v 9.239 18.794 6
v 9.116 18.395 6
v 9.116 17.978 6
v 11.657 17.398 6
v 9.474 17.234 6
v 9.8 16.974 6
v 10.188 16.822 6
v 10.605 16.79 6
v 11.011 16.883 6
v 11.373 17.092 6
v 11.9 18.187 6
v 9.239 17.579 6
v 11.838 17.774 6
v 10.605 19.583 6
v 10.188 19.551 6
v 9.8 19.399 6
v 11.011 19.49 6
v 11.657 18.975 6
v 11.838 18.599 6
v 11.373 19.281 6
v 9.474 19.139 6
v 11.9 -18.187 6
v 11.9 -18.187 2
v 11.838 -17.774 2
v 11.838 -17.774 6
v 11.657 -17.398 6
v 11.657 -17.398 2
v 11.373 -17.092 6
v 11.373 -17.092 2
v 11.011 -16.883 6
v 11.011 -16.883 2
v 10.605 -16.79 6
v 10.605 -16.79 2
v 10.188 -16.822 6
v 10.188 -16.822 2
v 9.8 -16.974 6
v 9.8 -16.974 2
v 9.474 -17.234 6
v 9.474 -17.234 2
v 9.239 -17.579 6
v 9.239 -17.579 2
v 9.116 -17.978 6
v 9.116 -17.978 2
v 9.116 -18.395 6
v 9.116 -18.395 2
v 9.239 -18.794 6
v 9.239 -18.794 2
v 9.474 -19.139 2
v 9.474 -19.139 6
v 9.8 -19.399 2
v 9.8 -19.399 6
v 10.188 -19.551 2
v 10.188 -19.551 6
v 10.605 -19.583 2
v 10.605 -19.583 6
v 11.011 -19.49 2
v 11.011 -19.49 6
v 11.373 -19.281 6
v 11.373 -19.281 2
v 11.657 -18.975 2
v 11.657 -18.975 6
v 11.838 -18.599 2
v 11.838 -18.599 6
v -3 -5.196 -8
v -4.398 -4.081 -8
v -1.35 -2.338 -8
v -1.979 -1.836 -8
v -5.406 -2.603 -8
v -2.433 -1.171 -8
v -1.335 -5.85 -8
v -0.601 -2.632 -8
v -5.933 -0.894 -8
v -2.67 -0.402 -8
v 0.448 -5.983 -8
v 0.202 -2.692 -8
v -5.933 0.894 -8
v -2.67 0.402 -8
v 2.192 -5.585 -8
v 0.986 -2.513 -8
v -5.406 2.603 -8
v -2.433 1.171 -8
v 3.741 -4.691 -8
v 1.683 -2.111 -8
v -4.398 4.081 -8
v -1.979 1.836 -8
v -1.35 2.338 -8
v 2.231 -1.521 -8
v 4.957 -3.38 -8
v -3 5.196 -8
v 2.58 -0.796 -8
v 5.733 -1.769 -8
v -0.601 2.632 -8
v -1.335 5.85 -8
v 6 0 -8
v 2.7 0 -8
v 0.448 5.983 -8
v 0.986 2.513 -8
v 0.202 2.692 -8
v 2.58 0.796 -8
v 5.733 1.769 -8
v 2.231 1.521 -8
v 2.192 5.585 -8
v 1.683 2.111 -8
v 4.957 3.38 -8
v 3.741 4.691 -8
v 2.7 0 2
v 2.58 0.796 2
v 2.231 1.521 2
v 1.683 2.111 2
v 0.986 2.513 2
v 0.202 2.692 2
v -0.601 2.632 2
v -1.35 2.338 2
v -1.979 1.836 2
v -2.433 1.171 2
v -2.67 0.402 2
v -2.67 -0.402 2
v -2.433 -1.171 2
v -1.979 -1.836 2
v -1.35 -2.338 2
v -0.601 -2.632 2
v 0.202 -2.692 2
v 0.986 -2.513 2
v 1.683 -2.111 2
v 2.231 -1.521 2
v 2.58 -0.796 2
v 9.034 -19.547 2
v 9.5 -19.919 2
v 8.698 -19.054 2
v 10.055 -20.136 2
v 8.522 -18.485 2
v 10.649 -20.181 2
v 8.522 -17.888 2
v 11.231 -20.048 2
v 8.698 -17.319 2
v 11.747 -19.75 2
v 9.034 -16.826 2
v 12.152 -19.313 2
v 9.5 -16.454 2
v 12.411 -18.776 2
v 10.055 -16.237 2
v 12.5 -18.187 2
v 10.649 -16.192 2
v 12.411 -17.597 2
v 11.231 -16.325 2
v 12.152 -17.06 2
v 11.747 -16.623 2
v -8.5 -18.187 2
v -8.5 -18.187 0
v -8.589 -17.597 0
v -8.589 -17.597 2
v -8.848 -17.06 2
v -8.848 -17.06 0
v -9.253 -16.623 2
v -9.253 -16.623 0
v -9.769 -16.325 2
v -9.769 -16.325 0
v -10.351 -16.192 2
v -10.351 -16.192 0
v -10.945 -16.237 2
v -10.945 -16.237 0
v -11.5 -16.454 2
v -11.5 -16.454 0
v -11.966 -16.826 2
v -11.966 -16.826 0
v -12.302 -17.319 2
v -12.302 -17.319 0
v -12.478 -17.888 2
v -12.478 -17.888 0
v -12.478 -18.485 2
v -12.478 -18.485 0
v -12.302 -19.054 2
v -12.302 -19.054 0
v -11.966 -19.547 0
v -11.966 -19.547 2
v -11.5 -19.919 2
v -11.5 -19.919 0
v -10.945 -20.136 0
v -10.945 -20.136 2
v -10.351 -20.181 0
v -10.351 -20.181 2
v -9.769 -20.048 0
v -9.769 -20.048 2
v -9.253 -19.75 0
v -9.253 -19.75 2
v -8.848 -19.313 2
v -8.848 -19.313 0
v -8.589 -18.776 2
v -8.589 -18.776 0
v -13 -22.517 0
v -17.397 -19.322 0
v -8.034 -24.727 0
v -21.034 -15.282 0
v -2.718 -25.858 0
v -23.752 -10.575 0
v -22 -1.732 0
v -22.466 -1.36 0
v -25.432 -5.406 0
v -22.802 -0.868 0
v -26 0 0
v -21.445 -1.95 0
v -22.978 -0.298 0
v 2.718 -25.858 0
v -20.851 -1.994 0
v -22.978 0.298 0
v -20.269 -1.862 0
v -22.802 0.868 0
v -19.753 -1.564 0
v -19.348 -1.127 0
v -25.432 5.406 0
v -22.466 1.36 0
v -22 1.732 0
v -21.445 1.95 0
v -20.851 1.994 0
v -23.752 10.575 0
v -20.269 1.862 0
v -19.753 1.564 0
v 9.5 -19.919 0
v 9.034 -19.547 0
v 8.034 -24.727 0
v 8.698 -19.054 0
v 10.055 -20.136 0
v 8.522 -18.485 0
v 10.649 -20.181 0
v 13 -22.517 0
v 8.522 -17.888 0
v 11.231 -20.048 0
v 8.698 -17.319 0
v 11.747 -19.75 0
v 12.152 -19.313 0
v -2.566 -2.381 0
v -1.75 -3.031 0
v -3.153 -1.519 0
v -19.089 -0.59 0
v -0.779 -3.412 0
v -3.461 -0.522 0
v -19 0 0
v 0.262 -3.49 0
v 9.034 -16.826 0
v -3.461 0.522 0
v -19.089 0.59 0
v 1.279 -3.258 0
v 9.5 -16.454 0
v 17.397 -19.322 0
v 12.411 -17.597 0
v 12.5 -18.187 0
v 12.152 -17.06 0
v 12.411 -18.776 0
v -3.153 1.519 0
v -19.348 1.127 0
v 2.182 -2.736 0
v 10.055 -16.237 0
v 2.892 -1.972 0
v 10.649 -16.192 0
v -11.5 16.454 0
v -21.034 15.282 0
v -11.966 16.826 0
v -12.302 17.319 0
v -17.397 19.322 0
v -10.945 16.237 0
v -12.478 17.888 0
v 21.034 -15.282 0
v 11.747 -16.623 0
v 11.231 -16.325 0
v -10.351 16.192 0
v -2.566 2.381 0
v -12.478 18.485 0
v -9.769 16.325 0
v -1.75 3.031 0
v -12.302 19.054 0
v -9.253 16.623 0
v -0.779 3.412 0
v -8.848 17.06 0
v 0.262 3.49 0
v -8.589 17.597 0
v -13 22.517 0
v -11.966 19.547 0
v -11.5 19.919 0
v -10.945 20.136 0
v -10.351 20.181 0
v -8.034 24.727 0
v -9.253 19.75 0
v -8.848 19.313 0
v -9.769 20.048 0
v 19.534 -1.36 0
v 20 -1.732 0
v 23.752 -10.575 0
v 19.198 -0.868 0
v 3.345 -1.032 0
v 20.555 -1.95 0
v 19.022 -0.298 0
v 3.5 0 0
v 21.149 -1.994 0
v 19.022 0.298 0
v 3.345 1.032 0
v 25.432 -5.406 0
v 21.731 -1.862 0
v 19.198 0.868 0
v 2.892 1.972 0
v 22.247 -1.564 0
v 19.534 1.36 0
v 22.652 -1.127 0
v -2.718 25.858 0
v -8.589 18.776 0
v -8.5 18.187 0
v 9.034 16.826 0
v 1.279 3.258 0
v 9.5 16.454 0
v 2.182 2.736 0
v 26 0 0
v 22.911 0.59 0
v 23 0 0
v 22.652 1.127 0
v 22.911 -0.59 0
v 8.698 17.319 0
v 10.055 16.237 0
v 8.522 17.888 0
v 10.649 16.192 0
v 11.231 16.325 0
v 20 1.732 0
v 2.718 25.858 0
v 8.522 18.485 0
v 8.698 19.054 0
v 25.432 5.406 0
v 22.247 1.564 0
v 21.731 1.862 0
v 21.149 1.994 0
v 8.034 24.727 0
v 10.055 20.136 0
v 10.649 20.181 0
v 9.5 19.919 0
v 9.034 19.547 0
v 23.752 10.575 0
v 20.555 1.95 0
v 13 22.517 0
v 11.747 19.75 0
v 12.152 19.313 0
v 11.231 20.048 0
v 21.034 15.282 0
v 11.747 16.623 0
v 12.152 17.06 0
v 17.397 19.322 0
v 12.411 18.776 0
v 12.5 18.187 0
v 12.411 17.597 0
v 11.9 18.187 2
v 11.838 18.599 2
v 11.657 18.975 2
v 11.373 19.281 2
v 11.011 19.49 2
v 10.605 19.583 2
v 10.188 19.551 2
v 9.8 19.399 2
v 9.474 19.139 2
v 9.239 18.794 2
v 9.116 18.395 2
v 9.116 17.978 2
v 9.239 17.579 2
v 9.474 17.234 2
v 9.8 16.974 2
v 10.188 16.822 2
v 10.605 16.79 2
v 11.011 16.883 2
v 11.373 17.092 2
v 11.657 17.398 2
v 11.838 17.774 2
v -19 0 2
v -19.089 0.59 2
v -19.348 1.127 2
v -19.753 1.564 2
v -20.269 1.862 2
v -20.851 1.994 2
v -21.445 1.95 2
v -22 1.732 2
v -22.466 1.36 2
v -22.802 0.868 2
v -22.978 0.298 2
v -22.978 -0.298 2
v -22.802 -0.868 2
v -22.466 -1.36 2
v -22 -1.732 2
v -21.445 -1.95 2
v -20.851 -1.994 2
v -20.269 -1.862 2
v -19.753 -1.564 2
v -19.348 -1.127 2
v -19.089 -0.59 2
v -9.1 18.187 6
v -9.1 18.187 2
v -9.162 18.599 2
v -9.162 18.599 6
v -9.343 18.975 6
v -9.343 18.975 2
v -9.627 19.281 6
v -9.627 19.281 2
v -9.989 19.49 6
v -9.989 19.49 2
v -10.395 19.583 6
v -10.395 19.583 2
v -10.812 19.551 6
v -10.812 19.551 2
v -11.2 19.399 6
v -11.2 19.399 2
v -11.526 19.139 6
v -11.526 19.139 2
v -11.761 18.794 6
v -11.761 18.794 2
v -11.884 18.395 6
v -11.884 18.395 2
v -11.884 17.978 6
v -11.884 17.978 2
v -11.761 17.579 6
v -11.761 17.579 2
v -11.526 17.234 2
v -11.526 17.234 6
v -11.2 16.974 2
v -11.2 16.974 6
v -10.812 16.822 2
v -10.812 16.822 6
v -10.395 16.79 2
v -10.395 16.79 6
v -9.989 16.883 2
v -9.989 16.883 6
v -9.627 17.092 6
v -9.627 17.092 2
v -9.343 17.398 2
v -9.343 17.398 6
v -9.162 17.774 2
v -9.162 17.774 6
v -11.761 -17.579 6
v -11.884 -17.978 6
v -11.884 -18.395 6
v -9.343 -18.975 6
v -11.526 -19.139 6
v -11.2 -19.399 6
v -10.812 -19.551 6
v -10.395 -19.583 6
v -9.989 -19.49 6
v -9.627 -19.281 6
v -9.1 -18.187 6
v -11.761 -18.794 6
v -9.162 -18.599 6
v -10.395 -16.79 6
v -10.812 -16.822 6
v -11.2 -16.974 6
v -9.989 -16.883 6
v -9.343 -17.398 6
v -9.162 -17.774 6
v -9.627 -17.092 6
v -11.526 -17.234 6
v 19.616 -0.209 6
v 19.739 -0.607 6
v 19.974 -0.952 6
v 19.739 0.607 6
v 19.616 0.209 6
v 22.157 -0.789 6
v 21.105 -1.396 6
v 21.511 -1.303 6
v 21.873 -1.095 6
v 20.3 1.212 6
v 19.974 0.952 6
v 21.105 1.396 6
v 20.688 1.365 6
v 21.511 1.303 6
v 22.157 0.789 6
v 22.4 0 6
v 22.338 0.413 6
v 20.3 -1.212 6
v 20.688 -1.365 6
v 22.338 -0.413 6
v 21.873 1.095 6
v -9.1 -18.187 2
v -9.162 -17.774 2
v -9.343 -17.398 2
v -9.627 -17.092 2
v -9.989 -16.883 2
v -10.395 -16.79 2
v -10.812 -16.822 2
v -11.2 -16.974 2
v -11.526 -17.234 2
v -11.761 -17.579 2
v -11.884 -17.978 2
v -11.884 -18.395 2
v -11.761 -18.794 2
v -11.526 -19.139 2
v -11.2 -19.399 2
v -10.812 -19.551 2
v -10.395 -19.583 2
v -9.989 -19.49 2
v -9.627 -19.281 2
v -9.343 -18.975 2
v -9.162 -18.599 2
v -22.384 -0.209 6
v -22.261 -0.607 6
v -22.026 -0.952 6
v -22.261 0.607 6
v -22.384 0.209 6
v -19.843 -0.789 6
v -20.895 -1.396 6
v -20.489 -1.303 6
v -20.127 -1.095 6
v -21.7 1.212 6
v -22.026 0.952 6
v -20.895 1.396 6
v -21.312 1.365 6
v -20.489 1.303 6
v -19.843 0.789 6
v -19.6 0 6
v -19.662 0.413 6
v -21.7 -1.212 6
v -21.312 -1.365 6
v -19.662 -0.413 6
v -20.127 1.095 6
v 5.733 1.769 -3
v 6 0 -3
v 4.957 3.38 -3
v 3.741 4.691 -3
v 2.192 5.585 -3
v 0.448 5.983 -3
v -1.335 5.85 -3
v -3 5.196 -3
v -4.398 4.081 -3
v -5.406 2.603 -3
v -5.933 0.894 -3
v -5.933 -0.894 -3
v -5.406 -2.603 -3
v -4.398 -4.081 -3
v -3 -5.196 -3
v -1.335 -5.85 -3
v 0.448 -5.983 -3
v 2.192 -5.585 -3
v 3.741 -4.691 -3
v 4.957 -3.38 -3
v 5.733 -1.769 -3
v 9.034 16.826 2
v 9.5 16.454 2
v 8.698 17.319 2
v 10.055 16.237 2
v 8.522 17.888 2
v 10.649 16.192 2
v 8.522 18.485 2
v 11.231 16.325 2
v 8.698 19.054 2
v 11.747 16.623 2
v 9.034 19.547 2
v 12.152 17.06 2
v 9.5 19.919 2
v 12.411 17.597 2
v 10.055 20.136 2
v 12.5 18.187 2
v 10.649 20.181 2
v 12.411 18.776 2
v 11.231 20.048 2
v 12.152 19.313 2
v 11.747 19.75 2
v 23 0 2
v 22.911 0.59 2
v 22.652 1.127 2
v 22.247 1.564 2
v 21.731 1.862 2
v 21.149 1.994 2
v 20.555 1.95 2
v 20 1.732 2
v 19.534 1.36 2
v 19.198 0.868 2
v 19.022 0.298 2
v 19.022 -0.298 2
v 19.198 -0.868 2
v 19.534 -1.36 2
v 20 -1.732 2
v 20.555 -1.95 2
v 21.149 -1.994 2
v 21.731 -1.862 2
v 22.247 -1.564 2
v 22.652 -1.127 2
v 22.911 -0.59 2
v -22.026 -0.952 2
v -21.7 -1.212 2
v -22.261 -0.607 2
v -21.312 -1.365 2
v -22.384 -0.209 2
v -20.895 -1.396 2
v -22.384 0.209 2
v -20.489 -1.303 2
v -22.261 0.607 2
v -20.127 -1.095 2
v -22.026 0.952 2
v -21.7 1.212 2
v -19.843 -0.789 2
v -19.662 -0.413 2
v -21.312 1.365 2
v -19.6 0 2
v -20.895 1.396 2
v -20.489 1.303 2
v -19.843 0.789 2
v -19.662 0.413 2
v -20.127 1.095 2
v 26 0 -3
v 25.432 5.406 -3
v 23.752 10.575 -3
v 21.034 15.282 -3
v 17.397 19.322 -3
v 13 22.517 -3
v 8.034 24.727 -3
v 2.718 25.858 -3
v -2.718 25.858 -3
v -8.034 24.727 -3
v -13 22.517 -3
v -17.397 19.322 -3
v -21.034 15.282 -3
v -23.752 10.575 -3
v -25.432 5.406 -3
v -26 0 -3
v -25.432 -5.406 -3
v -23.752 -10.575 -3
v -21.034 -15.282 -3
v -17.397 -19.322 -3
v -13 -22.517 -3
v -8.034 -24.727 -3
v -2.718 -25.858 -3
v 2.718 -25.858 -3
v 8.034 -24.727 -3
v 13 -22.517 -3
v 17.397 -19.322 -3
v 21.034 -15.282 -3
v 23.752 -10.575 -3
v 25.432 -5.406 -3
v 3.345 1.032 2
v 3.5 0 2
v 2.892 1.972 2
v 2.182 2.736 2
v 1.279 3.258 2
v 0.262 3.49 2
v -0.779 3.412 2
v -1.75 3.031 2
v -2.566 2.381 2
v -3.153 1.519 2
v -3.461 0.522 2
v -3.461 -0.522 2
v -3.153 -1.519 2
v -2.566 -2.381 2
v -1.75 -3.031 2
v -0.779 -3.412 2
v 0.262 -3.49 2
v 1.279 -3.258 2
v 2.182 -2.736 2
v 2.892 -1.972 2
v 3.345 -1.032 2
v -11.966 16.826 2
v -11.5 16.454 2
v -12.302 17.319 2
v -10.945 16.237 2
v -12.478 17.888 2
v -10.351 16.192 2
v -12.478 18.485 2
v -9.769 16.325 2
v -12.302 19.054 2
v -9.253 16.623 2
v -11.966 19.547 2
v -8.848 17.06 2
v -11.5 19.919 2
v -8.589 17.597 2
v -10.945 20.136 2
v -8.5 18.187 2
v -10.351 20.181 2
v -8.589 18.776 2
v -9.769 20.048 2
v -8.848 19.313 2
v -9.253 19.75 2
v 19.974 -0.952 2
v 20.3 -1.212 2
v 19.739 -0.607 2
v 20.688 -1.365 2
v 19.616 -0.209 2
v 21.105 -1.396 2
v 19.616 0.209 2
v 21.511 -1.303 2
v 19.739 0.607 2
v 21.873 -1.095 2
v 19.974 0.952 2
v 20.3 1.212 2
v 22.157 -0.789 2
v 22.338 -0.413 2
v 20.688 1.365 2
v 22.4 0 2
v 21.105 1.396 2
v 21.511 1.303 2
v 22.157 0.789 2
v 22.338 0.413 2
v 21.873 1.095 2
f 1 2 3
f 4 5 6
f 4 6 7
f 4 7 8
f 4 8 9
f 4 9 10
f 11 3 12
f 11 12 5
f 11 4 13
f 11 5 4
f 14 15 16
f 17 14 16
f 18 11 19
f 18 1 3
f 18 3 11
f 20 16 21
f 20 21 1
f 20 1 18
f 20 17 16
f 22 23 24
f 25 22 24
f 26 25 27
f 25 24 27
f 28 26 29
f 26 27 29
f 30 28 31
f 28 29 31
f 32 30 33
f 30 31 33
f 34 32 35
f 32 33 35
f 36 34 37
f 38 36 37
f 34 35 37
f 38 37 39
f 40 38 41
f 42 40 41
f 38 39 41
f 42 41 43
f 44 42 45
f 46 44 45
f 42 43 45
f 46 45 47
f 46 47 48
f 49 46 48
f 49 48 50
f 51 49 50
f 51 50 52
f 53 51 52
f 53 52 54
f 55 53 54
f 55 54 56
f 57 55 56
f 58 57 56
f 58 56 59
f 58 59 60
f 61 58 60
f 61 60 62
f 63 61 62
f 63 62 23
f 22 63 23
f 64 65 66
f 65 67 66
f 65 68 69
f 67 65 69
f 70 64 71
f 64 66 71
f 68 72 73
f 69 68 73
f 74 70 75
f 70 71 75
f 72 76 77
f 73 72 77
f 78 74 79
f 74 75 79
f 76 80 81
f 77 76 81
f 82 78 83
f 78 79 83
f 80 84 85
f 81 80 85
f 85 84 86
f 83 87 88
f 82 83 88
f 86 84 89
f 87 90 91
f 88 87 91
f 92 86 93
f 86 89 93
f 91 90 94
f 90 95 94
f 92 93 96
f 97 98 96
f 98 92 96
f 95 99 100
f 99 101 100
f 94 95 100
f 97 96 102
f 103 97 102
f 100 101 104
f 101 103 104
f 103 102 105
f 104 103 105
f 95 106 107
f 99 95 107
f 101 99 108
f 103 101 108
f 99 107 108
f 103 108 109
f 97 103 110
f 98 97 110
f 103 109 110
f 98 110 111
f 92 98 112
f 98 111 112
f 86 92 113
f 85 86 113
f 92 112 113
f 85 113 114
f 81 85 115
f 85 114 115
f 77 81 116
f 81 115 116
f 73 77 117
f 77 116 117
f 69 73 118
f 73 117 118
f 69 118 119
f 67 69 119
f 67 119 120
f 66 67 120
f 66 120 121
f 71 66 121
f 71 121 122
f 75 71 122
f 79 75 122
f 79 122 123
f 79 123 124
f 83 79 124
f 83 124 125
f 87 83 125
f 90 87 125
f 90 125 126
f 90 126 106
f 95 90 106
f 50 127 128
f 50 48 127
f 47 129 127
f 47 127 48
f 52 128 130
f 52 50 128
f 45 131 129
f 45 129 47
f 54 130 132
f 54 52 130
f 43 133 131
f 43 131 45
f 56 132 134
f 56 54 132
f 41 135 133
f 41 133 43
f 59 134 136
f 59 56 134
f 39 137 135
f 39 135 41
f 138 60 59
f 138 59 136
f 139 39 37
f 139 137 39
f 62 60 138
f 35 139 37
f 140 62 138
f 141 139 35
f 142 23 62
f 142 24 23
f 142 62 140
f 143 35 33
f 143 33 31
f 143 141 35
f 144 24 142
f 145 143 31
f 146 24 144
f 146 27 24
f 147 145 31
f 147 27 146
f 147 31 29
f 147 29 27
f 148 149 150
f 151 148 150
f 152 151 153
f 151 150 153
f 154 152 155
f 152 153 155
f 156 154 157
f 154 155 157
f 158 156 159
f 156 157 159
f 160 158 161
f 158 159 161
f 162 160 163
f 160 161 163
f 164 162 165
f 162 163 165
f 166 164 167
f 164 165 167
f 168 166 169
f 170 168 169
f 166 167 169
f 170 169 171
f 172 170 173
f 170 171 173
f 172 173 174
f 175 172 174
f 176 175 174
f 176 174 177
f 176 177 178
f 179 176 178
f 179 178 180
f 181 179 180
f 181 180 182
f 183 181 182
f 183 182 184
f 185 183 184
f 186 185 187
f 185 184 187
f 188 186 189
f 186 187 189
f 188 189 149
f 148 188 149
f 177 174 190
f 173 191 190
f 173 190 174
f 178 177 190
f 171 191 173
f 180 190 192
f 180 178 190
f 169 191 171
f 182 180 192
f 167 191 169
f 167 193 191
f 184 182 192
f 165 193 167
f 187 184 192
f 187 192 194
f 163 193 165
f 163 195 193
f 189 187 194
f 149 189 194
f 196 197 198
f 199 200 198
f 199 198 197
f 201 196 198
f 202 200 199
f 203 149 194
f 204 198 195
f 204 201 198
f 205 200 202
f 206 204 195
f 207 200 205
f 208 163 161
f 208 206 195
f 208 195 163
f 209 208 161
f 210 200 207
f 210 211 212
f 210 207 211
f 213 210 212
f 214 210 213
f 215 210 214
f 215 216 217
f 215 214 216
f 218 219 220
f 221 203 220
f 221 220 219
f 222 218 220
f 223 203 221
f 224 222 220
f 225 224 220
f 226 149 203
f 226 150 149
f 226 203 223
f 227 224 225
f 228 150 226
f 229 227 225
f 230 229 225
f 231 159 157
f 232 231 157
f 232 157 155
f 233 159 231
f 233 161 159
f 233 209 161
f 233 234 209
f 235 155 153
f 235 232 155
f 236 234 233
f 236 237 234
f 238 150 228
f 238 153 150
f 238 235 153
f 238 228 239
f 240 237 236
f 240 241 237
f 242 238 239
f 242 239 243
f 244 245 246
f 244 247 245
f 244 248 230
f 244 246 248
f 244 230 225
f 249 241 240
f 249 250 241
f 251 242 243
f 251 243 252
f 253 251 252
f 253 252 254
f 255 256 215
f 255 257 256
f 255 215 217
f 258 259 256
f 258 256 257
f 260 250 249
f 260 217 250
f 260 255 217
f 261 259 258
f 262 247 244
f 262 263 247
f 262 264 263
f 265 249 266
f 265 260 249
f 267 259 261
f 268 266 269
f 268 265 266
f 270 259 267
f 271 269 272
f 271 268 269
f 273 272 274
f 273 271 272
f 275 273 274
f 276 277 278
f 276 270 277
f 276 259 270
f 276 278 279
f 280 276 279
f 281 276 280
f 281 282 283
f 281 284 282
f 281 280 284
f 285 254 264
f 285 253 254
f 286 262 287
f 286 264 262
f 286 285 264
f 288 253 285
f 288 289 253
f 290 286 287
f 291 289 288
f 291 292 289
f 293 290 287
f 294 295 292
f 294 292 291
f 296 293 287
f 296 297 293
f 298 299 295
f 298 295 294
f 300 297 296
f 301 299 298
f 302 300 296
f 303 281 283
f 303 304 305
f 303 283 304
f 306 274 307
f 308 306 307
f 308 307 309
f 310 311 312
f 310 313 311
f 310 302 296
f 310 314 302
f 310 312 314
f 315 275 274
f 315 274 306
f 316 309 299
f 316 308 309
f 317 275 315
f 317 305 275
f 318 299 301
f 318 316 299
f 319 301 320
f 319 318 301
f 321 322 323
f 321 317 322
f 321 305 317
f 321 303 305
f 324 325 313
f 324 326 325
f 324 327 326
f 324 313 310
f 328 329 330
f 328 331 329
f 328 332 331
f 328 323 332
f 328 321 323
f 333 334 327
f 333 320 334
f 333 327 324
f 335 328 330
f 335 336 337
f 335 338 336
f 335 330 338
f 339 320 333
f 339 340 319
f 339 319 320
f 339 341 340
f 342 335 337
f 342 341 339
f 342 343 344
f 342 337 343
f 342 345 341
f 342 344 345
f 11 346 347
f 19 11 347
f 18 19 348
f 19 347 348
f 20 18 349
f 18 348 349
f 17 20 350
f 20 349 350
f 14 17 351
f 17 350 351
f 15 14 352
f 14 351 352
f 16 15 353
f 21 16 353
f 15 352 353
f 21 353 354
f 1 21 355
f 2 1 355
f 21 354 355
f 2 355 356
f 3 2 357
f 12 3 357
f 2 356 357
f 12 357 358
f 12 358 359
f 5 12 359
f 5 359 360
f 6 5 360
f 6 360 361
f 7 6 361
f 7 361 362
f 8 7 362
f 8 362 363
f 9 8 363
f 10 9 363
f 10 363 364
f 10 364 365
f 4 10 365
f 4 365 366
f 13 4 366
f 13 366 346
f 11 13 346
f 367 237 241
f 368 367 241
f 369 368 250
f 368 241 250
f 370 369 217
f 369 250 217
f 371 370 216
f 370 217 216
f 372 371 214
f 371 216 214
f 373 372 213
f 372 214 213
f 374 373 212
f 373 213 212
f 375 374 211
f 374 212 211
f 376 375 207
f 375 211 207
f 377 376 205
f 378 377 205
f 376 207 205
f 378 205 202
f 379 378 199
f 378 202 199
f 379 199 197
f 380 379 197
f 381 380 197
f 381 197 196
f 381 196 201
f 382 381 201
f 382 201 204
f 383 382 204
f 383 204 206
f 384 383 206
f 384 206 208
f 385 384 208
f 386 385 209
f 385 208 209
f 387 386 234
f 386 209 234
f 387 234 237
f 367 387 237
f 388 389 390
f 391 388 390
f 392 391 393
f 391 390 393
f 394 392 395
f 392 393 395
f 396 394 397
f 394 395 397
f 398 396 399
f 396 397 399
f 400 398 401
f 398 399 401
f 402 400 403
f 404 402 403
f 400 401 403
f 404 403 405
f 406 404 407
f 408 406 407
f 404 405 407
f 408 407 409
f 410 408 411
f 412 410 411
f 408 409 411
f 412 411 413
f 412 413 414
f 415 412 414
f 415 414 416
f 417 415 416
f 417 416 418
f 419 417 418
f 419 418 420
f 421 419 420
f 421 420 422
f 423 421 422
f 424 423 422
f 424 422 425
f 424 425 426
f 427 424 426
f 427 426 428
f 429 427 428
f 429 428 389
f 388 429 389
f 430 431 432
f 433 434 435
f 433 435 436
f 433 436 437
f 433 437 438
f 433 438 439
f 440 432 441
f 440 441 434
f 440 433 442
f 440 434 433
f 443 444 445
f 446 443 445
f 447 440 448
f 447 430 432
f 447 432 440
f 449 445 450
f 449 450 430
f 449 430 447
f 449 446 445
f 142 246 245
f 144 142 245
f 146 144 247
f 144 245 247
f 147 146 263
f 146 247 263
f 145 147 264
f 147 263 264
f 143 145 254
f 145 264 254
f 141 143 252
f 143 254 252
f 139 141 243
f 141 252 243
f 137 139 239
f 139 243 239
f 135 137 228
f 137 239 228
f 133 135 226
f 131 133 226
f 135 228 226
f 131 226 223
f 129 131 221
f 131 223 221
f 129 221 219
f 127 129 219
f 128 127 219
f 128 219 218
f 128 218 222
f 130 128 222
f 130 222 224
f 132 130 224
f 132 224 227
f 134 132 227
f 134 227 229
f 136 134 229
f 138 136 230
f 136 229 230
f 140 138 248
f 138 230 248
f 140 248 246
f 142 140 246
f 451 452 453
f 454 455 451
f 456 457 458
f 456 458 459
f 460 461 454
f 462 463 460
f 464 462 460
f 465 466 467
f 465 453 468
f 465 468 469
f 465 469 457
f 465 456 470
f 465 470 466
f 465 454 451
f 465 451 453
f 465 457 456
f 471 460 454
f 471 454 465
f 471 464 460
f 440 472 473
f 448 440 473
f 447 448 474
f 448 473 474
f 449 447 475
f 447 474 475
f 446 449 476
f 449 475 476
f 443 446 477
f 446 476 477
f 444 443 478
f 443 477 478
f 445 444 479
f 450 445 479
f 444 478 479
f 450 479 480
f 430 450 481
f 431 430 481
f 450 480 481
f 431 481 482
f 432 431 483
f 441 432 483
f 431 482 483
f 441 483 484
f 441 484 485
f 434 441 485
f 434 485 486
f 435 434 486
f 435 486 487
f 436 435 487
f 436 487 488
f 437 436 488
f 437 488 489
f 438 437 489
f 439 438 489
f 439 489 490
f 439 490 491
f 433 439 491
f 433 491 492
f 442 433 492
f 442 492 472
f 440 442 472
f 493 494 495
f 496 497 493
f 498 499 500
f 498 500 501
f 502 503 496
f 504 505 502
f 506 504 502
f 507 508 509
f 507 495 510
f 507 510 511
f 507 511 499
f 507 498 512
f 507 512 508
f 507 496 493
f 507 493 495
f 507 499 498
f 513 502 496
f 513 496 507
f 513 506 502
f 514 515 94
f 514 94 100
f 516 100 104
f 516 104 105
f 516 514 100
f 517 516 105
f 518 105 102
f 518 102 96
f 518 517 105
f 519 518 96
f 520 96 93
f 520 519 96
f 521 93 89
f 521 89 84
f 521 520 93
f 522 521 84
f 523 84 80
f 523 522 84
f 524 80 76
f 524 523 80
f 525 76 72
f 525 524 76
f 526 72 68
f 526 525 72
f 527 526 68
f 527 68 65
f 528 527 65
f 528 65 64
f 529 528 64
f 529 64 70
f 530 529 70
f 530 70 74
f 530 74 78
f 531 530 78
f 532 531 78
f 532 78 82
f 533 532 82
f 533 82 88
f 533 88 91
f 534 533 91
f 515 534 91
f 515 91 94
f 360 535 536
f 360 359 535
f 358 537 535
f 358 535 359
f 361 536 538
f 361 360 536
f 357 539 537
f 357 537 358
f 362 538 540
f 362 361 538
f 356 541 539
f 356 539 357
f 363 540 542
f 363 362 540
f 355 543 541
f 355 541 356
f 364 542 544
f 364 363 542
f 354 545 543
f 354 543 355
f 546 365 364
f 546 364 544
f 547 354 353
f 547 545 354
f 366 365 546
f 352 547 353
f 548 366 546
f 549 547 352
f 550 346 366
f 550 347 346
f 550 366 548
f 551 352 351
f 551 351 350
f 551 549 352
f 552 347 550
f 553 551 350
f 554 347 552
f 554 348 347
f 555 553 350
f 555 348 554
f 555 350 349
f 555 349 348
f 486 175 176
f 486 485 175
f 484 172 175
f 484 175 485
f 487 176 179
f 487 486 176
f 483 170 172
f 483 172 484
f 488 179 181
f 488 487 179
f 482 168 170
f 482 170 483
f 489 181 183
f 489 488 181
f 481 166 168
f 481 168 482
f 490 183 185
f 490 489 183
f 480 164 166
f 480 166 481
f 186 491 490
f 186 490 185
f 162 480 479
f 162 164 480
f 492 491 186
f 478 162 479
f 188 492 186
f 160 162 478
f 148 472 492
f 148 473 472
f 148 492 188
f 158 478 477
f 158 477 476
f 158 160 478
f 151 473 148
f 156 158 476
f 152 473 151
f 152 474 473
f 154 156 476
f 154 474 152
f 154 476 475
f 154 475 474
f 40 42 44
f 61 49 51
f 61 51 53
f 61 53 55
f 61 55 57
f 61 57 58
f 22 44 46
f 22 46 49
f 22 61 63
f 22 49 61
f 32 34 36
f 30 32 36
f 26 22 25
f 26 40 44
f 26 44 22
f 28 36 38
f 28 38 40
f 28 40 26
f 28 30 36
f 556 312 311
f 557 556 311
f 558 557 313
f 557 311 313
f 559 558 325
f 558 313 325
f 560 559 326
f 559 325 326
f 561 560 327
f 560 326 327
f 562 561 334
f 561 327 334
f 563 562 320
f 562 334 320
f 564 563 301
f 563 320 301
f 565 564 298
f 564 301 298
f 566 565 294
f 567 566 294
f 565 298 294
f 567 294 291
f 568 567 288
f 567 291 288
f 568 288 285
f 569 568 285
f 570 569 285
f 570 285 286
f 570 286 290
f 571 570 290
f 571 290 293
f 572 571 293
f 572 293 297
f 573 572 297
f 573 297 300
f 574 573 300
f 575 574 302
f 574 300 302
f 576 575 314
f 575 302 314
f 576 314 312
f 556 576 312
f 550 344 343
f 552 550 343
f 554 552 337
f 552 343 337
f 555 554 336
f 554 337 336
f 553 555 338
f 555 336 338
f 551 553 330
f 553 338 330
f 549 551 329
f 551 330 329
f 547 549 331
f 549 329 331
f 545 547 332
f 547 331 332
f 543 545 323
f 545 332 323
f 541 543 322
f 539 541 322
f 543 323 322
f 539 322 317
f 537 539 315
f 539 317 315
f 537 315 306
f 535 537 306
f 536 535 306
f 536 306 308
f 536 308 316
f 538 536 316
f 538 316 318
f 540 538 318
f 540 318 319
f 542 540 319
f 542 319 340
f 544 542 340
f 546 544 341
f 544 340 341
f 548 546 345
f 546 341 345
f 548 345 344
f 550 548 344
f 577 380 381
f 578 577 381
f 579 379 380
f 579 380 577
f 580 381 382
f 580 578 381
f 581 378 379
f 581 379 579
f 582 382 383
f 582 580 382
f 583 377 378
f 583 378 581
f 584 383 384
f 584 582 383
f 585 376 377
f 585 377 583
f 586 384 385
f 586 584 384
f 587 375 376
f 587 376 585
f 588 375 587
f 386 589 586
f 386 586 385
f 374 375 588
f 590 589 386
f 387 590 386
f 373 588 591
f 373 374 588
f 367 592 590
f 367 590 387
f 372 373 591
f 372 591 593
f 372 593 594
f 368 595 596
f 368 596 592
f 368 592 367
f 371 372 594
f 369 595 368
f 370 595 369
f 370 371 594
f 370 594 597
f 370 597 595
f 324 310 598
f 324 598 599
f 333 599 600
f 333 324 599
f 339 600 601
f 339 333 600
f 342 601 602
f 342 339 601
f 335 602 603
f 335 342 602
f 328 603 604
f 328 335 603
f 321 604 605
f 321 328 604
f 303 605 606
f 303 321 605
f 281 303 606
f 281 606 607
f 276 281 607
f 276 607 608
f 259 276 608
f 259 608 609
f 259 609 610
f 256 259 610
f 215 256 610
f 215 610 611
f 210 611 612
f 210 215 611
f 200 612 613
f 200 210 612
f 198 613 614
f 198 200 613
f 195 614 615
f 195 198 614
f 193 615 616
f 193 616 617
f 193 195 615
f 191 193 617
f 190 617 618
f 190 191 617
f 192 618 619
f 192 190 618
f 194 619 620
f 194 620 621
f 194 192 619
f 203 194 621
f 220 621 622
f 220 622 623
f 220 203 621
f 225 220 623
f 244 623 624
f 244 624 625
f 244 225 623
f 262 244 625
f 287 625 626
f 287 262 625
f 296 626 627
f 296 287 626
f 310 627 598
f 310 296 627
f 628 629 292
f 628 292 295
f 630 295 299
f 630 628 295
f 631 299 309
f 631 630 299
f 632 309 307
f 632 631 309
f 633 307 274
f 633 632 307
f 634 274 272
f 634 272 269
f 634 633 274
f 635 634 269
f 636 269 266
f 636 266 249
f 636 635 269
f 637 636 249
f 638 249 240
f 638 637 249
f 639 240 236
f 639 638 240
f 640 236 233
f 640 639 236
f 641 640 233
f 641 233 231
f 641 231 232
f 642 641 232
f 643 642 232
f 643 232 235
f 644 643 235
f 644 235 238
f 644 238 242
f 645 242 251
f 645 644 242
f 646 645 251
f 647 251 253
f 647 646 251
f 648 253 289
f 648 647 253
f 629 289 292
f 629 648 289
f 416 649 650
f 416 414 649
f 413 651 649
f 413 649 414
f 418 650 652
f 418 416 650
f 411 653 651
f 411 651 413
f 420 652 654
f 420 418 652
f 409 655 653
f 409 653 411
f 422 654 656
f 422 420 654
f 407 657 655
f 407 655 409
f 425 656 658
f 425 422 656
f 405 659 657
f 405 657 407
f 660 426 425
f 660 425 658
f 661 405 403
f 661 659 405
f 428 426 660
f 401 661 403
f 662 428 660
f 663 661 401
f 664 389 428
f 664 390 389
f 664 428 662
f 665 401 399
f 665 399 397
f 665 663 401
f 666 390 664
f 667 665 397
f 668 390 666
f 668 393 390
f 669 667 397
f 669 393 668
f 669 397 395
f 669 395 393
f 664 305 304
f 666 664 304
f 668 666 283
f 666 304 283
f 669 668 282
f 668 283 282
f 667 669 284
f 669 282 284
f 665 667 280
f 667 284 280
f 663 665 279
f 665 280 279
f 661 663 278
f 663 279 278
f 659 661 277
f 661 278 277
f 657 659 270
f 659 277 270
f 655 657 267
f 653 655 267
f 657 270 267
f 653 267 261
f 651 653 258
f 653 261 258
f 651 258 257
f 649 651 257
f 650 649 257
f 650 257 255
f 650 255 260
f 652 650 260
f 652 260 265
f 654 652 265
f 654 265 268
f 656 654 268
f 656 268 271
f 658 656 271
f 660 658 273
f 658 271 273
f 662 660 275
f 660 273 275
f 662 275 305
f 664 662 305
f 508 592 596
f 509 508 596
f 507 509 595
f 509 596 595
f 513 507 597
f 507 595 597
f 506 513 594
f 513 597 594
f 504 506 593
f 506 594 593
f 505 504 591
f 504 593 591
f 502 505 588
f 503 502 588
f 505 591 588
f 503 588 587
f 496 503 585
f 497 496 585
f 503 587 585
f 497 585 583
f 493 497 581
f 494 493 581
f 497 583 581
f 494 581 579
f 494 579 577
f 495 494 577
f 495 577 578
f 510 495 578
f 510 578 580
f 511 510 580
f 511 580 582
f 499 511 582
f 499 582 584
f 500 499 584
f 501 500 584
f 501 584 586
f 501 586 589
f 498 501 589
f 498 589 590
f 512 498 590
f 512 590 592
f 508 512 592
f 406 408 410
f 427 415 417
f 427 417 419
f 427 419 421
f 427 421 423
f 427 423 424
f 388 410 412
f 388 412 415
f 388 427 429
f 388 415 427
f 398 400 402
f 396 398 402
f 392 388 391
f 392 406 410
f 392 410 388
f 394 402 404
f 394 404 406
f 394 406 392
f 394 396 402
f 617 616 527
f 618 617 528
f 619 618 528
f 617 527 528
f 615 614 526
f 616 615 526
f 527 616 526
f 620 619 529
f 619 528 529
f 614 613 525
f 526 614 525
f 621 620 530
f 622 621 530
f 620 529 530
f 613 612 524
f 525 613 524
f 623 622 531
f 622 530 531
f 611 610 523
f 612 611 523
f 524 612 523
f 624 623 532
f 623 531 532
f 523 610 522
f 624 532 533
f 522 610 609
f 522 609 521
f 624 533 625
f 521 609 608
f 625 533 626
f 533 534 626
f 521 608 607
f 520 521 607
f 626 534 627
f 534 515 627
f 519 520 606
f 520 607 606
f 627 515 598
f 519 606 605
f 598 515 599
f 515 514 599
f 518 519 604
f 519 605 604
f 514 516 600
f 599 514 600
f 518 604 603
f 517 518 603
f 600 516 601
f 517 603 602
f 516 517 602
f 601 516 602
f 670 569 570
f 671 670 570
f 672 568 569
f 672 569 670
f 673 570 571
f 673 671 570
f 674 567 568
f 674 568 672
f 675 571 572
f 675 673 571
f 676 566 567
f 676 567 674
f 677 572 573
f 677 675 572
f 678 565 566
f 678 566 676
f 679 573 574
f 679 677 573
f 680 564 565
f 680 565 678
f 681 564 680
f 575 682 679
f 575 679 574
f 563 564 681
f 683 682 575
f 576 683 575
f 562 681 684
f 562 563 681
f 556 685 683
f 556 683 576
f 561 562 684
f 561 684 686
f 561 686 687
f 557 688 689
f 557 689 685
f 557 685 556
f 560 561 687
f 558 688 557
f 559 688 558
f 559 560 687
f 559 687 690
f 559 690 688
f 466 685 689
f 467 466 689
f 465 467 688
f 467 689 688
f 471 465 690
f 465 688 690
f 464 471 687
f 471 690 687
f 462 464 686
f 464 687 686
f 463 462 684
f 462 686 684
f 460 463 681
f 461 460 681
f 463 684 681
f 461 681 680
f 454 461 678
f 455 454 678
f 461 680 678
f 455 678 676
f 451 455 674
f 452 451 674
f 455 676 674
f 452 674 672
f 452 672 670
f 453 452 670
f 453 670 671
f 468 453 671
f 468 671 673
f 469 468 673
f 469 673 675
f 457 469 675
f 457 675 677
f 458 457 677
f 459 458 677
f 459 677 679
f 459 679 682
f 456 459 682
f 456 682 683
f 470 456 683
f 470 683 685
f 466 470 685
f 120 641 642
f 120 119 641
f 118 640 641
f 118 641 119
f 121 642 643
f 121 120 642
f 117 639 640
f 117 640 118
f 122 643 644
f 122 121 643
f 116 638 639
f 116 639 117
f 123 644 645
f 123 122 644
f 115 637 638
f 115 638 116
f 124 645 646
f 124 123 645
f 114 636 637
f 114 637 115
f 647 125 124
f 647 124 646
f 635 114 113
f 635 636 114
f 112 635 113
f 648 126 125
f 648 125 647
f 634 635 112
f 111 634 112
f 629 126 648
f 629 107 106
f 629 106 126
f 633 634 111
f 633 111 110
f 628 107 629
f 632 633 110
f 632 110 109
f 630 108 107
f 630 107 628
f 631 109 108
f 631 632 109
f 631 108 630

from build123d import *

# Parameters (mm, degrees)
SKETCH_1_R          = 26
EXTRUDE_1_DEPTH     = 3
SKETCH_2_R          = 1.4
EXTRUDE_2_DEPTH     = 6
SKETCH_4_R          = 2
EXTRUDE_4_DEPTH     = 2
SKETCH_5_R          = 6
CUT_EXTRUDE_1_DEPTH = 38.25587202
SKETCH_7_R          = 6
SKETCH_7_R_2        = 2.7
EXTRUDE_1_2_DEPTH   = 8
EXTRUDE_START       = 2
SKETCH_8_R          = 3.5
SKETCH_8_R_2        = 2.7
EXTRUDE_2_2_DEPTH   = 2


with BuildPart() as part:
    # 草图1 → Extrude 1 (new body)
    with BuildSketch(Plane.XY):
        Circle(SKETCH_1_R)
    extrude(amount=-EXTRUDE_1_DEPTH)

    # 草图2 → Extrude 2 (add)
    with BuildSketch(Plane.XY):
        with Locations((-21, 0)):
            Circle(SKETCH_2_R)
        with Locations((-10.5, 18.186533479)):
            Circle(SKETCH_2_R)
        with Locations((10.5, 18.186533479)):
            Circle(SKETCH_2_R)
        with Locations((21, 0)):
            Circle(SKETCH_2_R)
        with Locations((10.5, -18.186533479)):
            Circle(SKETCH_2_R)
        with Locations((-10.5, -18.186533479)):
            Circle(SKETCH_2_R)
    extrude(amount=EXTRUDE_2_DEPTH)

    # 草图4 → 凸台-拉伸4 (add)
    with BuildSketch(Plane.XY):
        with Locations((-10.5, 18.186533479)):
            Circle(SKETCH_4_R)
        with Locations((10.5, 18.186533479)):
            Circle(SKETCH_4_R)
        with Locations((21, 0)):
            Circle(SKETCH_4_R)
        with Locations((10.5, -18.186533479)):
            Circle(SKETCH_4_R)
        with Locations((-10.5, -18.186533479)):
            Circle(SKETCH_4_R)
        with Locations((-21, 0)):
            Circle(SKETCH_4_R)
    extrude(amount=EXTRUDE_4_DEPTH)

    # 草图5 → 切除-拉伸1 (cut, through all)
    with BuildSketch(Plane.XY):
        Circle(SKETCH_5_R)
    extrude(amount=-CUT_EXTRUDE_1_DEPTH, mode=Mode.SUBTRACT)

    # 草图7 → Extrude 1 2 (add)
    with BuildSketch(Plane.XY):
        Circle(SKETCH_7_R)
        Circle(SKETCH_7_R_2, mode=Mode.SUBTRACT)
    extrude(amount=-EXTRUDE_1_2_DEPTH)

    # 草图8 → Extrude 2 2 (add)
    with BuildSketch(Plane.XY.offset(EXTRUDE_START)):
        Circle(SKETCH_8_R)
        Circle(SKETCH_8_R_2, mode=Mode.SUBTRACT)
    extrude(amount=-EXTRUDE_2_2_DEPTH)


solid = part.part
